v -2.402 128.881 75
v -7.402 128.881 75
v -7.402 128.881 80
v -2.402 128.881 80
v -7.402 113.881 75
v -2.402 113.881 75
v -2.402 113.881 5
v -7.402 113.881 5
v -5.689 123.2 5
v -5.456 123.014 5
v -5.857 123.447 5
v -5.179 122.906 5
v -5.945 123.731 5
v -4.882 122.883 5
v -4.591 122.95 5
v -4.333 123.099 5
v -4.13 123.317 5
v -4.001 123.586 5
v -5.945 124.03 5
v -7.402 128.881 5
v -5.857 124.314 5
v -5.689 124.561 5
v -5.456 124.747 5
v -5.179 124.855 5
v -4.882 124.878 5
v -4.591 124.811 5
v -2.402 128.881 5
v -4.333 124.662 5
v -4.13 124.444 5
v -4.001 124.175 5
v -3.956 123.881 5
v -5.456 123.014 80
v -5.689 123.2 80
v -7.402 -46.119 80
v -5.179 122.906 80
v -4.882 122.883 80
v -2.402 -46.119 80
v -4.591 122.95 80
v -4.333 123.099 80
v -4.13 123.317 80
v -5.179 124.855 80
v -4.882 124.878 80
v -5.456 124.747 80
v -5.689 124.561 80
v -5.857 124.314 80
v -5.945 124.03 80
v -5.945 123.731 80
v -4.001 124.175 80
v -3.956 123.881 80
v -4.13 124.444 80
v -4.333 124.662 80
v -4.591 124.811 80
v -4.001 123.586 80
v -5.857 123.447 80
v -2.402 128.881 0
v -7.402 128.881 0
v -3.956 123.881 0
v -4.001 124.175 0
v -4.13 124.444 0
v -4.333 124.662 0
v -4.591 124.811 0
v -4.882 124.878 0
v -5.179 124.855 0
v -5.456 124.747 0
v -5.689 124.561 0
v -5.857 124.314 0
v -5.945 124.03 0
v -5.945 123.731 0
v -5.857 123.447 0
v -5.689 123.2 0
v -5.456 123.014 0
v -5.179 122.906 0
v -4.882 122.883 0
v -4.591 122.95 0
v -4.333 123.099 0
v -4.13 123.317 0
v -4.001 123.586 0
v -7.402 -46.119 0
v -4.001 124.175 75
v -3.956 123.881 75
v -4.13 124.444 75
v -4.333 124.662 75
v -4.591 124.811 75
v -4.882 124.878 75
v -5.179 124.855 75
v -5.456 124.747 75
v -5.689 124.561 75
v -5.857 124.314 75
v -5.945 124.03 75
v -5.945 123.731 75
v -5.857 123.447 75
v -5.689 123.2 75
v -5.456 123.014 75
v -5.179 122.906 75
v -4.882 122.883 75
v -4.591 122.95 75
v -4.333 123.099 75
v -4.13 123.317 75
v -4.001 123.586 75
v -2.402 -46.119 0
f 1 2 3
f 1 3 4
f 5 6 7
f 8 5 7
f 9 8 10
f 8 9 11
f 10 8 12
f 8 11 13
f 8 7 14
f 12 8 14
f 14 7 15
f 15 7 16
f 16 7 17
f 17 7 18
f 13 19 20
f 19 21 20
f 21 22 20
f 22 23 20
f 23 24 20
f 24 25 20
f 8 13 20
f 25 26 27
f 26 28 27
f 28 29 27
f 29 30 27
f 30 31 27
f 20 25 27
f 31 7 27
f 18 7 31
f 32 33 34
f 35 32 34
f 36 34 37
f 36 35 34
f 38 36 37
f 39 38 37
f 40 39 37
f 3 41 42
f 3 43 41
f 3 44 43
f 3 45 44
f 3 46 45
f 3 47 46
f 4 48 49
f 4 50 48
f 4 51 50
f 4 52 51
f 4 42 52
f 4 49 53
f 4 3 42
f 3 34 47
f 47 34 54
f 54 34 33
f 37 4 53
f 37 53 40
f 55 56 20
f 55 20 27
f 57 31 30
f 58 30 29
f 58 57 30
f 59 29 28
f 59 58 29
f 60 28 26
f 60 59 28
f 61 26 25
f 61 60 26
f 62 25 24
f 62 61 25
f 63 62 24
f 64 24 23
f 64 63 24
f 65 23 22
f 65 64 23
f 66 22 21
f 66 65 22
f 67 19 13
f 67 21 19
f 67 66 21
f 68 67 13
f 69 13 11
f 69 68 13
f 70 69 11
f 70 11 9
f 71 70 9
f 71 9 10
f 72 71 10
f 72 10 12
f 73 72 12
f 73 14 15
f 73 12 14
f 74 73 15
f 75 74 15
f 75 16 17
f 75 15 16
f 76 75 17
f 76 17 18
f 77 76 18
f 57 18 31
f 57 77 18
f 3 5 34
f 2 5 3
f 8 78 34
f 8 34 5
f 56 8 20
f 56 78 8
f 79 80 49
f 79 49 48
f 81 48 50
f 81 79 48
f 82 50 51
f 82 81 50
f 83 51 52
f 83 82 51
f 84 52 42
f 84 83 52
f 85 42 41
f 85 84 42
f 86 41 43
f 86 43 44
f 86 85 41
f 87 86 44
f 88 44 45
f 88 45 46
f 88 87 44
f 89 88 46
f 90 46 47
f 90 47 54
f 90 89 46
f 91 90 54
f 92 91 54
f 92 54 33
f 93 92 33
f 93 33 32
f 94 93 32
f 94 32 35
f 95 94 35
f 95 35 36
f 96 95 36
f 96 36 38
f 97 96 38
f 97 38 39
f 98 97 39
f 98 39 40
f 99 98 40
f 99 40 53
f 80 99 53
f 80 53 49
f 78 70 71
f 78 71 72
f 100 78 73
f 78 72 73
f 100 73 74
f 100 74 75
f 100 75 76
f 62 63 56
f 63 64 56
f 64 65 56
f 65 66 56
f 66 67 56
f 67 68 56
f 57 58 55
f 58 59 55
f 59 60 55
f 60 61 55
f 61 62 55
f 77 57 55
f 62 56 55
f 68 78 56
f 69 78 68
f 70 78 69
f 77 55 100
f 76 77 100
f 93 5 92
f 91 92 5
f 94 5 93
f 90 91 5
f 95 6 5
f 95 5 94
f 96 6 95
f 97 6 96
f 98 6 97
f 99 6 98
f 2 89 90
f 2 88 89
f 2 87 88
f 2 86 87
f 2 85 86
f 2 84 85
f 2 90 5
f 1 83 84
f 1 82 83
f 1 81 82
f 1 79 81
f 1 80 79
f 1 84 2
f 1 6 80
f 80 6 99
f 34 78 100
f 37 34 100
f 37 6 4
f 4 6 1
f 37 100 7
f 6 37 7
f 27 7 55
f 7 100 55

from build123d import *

# Parameters (mm, degrees)
ESQUISSE1_W             = 5
ESQUISSE1_H             = 175
ESQUISSE1_R             = 1
BOSS_EXTRU_1_DEPTH      = 80
ESQUISSE2_W             = 70
ESQUISSE2_H             = 15
ENL_V_MAT_EXTRU_1_DEPTH = 20


with BuildPart() as part:
    # Esquisse1 → Boss.-Extru.1 (new body)
    with BuildSketch(Plane.XY):
        with Locations((-4.901501369, 41.380516432)):
            Rectangle(ESQUISSE1_W, ESQUISSE1_H)
        with Locations((-4.956438342, 123.880516432)):
            Circle(ESQUISSE1_R, mode=Mode.SUBTRACT)
    extrude(amount=BOSS_EXTRU_1_DEPTH)

    # Esquisse2 → Enlèv. mat.-Extru.1 (cut)
    with BuildSketch(Plane(origin=(0, 0, 0), x_dir=(0, 0, -1), z_dir=(1, 0, 0))):
        with Locations((-40, 121.380516432)):
            Rectangle(ESQUISSE2_W, ESQUISSE2_H)
    extrude(amount=-ENL_V_MAT_EXTRU_1_DEPTH, mode=Mode.SUBTRACT)


solid = part.part
